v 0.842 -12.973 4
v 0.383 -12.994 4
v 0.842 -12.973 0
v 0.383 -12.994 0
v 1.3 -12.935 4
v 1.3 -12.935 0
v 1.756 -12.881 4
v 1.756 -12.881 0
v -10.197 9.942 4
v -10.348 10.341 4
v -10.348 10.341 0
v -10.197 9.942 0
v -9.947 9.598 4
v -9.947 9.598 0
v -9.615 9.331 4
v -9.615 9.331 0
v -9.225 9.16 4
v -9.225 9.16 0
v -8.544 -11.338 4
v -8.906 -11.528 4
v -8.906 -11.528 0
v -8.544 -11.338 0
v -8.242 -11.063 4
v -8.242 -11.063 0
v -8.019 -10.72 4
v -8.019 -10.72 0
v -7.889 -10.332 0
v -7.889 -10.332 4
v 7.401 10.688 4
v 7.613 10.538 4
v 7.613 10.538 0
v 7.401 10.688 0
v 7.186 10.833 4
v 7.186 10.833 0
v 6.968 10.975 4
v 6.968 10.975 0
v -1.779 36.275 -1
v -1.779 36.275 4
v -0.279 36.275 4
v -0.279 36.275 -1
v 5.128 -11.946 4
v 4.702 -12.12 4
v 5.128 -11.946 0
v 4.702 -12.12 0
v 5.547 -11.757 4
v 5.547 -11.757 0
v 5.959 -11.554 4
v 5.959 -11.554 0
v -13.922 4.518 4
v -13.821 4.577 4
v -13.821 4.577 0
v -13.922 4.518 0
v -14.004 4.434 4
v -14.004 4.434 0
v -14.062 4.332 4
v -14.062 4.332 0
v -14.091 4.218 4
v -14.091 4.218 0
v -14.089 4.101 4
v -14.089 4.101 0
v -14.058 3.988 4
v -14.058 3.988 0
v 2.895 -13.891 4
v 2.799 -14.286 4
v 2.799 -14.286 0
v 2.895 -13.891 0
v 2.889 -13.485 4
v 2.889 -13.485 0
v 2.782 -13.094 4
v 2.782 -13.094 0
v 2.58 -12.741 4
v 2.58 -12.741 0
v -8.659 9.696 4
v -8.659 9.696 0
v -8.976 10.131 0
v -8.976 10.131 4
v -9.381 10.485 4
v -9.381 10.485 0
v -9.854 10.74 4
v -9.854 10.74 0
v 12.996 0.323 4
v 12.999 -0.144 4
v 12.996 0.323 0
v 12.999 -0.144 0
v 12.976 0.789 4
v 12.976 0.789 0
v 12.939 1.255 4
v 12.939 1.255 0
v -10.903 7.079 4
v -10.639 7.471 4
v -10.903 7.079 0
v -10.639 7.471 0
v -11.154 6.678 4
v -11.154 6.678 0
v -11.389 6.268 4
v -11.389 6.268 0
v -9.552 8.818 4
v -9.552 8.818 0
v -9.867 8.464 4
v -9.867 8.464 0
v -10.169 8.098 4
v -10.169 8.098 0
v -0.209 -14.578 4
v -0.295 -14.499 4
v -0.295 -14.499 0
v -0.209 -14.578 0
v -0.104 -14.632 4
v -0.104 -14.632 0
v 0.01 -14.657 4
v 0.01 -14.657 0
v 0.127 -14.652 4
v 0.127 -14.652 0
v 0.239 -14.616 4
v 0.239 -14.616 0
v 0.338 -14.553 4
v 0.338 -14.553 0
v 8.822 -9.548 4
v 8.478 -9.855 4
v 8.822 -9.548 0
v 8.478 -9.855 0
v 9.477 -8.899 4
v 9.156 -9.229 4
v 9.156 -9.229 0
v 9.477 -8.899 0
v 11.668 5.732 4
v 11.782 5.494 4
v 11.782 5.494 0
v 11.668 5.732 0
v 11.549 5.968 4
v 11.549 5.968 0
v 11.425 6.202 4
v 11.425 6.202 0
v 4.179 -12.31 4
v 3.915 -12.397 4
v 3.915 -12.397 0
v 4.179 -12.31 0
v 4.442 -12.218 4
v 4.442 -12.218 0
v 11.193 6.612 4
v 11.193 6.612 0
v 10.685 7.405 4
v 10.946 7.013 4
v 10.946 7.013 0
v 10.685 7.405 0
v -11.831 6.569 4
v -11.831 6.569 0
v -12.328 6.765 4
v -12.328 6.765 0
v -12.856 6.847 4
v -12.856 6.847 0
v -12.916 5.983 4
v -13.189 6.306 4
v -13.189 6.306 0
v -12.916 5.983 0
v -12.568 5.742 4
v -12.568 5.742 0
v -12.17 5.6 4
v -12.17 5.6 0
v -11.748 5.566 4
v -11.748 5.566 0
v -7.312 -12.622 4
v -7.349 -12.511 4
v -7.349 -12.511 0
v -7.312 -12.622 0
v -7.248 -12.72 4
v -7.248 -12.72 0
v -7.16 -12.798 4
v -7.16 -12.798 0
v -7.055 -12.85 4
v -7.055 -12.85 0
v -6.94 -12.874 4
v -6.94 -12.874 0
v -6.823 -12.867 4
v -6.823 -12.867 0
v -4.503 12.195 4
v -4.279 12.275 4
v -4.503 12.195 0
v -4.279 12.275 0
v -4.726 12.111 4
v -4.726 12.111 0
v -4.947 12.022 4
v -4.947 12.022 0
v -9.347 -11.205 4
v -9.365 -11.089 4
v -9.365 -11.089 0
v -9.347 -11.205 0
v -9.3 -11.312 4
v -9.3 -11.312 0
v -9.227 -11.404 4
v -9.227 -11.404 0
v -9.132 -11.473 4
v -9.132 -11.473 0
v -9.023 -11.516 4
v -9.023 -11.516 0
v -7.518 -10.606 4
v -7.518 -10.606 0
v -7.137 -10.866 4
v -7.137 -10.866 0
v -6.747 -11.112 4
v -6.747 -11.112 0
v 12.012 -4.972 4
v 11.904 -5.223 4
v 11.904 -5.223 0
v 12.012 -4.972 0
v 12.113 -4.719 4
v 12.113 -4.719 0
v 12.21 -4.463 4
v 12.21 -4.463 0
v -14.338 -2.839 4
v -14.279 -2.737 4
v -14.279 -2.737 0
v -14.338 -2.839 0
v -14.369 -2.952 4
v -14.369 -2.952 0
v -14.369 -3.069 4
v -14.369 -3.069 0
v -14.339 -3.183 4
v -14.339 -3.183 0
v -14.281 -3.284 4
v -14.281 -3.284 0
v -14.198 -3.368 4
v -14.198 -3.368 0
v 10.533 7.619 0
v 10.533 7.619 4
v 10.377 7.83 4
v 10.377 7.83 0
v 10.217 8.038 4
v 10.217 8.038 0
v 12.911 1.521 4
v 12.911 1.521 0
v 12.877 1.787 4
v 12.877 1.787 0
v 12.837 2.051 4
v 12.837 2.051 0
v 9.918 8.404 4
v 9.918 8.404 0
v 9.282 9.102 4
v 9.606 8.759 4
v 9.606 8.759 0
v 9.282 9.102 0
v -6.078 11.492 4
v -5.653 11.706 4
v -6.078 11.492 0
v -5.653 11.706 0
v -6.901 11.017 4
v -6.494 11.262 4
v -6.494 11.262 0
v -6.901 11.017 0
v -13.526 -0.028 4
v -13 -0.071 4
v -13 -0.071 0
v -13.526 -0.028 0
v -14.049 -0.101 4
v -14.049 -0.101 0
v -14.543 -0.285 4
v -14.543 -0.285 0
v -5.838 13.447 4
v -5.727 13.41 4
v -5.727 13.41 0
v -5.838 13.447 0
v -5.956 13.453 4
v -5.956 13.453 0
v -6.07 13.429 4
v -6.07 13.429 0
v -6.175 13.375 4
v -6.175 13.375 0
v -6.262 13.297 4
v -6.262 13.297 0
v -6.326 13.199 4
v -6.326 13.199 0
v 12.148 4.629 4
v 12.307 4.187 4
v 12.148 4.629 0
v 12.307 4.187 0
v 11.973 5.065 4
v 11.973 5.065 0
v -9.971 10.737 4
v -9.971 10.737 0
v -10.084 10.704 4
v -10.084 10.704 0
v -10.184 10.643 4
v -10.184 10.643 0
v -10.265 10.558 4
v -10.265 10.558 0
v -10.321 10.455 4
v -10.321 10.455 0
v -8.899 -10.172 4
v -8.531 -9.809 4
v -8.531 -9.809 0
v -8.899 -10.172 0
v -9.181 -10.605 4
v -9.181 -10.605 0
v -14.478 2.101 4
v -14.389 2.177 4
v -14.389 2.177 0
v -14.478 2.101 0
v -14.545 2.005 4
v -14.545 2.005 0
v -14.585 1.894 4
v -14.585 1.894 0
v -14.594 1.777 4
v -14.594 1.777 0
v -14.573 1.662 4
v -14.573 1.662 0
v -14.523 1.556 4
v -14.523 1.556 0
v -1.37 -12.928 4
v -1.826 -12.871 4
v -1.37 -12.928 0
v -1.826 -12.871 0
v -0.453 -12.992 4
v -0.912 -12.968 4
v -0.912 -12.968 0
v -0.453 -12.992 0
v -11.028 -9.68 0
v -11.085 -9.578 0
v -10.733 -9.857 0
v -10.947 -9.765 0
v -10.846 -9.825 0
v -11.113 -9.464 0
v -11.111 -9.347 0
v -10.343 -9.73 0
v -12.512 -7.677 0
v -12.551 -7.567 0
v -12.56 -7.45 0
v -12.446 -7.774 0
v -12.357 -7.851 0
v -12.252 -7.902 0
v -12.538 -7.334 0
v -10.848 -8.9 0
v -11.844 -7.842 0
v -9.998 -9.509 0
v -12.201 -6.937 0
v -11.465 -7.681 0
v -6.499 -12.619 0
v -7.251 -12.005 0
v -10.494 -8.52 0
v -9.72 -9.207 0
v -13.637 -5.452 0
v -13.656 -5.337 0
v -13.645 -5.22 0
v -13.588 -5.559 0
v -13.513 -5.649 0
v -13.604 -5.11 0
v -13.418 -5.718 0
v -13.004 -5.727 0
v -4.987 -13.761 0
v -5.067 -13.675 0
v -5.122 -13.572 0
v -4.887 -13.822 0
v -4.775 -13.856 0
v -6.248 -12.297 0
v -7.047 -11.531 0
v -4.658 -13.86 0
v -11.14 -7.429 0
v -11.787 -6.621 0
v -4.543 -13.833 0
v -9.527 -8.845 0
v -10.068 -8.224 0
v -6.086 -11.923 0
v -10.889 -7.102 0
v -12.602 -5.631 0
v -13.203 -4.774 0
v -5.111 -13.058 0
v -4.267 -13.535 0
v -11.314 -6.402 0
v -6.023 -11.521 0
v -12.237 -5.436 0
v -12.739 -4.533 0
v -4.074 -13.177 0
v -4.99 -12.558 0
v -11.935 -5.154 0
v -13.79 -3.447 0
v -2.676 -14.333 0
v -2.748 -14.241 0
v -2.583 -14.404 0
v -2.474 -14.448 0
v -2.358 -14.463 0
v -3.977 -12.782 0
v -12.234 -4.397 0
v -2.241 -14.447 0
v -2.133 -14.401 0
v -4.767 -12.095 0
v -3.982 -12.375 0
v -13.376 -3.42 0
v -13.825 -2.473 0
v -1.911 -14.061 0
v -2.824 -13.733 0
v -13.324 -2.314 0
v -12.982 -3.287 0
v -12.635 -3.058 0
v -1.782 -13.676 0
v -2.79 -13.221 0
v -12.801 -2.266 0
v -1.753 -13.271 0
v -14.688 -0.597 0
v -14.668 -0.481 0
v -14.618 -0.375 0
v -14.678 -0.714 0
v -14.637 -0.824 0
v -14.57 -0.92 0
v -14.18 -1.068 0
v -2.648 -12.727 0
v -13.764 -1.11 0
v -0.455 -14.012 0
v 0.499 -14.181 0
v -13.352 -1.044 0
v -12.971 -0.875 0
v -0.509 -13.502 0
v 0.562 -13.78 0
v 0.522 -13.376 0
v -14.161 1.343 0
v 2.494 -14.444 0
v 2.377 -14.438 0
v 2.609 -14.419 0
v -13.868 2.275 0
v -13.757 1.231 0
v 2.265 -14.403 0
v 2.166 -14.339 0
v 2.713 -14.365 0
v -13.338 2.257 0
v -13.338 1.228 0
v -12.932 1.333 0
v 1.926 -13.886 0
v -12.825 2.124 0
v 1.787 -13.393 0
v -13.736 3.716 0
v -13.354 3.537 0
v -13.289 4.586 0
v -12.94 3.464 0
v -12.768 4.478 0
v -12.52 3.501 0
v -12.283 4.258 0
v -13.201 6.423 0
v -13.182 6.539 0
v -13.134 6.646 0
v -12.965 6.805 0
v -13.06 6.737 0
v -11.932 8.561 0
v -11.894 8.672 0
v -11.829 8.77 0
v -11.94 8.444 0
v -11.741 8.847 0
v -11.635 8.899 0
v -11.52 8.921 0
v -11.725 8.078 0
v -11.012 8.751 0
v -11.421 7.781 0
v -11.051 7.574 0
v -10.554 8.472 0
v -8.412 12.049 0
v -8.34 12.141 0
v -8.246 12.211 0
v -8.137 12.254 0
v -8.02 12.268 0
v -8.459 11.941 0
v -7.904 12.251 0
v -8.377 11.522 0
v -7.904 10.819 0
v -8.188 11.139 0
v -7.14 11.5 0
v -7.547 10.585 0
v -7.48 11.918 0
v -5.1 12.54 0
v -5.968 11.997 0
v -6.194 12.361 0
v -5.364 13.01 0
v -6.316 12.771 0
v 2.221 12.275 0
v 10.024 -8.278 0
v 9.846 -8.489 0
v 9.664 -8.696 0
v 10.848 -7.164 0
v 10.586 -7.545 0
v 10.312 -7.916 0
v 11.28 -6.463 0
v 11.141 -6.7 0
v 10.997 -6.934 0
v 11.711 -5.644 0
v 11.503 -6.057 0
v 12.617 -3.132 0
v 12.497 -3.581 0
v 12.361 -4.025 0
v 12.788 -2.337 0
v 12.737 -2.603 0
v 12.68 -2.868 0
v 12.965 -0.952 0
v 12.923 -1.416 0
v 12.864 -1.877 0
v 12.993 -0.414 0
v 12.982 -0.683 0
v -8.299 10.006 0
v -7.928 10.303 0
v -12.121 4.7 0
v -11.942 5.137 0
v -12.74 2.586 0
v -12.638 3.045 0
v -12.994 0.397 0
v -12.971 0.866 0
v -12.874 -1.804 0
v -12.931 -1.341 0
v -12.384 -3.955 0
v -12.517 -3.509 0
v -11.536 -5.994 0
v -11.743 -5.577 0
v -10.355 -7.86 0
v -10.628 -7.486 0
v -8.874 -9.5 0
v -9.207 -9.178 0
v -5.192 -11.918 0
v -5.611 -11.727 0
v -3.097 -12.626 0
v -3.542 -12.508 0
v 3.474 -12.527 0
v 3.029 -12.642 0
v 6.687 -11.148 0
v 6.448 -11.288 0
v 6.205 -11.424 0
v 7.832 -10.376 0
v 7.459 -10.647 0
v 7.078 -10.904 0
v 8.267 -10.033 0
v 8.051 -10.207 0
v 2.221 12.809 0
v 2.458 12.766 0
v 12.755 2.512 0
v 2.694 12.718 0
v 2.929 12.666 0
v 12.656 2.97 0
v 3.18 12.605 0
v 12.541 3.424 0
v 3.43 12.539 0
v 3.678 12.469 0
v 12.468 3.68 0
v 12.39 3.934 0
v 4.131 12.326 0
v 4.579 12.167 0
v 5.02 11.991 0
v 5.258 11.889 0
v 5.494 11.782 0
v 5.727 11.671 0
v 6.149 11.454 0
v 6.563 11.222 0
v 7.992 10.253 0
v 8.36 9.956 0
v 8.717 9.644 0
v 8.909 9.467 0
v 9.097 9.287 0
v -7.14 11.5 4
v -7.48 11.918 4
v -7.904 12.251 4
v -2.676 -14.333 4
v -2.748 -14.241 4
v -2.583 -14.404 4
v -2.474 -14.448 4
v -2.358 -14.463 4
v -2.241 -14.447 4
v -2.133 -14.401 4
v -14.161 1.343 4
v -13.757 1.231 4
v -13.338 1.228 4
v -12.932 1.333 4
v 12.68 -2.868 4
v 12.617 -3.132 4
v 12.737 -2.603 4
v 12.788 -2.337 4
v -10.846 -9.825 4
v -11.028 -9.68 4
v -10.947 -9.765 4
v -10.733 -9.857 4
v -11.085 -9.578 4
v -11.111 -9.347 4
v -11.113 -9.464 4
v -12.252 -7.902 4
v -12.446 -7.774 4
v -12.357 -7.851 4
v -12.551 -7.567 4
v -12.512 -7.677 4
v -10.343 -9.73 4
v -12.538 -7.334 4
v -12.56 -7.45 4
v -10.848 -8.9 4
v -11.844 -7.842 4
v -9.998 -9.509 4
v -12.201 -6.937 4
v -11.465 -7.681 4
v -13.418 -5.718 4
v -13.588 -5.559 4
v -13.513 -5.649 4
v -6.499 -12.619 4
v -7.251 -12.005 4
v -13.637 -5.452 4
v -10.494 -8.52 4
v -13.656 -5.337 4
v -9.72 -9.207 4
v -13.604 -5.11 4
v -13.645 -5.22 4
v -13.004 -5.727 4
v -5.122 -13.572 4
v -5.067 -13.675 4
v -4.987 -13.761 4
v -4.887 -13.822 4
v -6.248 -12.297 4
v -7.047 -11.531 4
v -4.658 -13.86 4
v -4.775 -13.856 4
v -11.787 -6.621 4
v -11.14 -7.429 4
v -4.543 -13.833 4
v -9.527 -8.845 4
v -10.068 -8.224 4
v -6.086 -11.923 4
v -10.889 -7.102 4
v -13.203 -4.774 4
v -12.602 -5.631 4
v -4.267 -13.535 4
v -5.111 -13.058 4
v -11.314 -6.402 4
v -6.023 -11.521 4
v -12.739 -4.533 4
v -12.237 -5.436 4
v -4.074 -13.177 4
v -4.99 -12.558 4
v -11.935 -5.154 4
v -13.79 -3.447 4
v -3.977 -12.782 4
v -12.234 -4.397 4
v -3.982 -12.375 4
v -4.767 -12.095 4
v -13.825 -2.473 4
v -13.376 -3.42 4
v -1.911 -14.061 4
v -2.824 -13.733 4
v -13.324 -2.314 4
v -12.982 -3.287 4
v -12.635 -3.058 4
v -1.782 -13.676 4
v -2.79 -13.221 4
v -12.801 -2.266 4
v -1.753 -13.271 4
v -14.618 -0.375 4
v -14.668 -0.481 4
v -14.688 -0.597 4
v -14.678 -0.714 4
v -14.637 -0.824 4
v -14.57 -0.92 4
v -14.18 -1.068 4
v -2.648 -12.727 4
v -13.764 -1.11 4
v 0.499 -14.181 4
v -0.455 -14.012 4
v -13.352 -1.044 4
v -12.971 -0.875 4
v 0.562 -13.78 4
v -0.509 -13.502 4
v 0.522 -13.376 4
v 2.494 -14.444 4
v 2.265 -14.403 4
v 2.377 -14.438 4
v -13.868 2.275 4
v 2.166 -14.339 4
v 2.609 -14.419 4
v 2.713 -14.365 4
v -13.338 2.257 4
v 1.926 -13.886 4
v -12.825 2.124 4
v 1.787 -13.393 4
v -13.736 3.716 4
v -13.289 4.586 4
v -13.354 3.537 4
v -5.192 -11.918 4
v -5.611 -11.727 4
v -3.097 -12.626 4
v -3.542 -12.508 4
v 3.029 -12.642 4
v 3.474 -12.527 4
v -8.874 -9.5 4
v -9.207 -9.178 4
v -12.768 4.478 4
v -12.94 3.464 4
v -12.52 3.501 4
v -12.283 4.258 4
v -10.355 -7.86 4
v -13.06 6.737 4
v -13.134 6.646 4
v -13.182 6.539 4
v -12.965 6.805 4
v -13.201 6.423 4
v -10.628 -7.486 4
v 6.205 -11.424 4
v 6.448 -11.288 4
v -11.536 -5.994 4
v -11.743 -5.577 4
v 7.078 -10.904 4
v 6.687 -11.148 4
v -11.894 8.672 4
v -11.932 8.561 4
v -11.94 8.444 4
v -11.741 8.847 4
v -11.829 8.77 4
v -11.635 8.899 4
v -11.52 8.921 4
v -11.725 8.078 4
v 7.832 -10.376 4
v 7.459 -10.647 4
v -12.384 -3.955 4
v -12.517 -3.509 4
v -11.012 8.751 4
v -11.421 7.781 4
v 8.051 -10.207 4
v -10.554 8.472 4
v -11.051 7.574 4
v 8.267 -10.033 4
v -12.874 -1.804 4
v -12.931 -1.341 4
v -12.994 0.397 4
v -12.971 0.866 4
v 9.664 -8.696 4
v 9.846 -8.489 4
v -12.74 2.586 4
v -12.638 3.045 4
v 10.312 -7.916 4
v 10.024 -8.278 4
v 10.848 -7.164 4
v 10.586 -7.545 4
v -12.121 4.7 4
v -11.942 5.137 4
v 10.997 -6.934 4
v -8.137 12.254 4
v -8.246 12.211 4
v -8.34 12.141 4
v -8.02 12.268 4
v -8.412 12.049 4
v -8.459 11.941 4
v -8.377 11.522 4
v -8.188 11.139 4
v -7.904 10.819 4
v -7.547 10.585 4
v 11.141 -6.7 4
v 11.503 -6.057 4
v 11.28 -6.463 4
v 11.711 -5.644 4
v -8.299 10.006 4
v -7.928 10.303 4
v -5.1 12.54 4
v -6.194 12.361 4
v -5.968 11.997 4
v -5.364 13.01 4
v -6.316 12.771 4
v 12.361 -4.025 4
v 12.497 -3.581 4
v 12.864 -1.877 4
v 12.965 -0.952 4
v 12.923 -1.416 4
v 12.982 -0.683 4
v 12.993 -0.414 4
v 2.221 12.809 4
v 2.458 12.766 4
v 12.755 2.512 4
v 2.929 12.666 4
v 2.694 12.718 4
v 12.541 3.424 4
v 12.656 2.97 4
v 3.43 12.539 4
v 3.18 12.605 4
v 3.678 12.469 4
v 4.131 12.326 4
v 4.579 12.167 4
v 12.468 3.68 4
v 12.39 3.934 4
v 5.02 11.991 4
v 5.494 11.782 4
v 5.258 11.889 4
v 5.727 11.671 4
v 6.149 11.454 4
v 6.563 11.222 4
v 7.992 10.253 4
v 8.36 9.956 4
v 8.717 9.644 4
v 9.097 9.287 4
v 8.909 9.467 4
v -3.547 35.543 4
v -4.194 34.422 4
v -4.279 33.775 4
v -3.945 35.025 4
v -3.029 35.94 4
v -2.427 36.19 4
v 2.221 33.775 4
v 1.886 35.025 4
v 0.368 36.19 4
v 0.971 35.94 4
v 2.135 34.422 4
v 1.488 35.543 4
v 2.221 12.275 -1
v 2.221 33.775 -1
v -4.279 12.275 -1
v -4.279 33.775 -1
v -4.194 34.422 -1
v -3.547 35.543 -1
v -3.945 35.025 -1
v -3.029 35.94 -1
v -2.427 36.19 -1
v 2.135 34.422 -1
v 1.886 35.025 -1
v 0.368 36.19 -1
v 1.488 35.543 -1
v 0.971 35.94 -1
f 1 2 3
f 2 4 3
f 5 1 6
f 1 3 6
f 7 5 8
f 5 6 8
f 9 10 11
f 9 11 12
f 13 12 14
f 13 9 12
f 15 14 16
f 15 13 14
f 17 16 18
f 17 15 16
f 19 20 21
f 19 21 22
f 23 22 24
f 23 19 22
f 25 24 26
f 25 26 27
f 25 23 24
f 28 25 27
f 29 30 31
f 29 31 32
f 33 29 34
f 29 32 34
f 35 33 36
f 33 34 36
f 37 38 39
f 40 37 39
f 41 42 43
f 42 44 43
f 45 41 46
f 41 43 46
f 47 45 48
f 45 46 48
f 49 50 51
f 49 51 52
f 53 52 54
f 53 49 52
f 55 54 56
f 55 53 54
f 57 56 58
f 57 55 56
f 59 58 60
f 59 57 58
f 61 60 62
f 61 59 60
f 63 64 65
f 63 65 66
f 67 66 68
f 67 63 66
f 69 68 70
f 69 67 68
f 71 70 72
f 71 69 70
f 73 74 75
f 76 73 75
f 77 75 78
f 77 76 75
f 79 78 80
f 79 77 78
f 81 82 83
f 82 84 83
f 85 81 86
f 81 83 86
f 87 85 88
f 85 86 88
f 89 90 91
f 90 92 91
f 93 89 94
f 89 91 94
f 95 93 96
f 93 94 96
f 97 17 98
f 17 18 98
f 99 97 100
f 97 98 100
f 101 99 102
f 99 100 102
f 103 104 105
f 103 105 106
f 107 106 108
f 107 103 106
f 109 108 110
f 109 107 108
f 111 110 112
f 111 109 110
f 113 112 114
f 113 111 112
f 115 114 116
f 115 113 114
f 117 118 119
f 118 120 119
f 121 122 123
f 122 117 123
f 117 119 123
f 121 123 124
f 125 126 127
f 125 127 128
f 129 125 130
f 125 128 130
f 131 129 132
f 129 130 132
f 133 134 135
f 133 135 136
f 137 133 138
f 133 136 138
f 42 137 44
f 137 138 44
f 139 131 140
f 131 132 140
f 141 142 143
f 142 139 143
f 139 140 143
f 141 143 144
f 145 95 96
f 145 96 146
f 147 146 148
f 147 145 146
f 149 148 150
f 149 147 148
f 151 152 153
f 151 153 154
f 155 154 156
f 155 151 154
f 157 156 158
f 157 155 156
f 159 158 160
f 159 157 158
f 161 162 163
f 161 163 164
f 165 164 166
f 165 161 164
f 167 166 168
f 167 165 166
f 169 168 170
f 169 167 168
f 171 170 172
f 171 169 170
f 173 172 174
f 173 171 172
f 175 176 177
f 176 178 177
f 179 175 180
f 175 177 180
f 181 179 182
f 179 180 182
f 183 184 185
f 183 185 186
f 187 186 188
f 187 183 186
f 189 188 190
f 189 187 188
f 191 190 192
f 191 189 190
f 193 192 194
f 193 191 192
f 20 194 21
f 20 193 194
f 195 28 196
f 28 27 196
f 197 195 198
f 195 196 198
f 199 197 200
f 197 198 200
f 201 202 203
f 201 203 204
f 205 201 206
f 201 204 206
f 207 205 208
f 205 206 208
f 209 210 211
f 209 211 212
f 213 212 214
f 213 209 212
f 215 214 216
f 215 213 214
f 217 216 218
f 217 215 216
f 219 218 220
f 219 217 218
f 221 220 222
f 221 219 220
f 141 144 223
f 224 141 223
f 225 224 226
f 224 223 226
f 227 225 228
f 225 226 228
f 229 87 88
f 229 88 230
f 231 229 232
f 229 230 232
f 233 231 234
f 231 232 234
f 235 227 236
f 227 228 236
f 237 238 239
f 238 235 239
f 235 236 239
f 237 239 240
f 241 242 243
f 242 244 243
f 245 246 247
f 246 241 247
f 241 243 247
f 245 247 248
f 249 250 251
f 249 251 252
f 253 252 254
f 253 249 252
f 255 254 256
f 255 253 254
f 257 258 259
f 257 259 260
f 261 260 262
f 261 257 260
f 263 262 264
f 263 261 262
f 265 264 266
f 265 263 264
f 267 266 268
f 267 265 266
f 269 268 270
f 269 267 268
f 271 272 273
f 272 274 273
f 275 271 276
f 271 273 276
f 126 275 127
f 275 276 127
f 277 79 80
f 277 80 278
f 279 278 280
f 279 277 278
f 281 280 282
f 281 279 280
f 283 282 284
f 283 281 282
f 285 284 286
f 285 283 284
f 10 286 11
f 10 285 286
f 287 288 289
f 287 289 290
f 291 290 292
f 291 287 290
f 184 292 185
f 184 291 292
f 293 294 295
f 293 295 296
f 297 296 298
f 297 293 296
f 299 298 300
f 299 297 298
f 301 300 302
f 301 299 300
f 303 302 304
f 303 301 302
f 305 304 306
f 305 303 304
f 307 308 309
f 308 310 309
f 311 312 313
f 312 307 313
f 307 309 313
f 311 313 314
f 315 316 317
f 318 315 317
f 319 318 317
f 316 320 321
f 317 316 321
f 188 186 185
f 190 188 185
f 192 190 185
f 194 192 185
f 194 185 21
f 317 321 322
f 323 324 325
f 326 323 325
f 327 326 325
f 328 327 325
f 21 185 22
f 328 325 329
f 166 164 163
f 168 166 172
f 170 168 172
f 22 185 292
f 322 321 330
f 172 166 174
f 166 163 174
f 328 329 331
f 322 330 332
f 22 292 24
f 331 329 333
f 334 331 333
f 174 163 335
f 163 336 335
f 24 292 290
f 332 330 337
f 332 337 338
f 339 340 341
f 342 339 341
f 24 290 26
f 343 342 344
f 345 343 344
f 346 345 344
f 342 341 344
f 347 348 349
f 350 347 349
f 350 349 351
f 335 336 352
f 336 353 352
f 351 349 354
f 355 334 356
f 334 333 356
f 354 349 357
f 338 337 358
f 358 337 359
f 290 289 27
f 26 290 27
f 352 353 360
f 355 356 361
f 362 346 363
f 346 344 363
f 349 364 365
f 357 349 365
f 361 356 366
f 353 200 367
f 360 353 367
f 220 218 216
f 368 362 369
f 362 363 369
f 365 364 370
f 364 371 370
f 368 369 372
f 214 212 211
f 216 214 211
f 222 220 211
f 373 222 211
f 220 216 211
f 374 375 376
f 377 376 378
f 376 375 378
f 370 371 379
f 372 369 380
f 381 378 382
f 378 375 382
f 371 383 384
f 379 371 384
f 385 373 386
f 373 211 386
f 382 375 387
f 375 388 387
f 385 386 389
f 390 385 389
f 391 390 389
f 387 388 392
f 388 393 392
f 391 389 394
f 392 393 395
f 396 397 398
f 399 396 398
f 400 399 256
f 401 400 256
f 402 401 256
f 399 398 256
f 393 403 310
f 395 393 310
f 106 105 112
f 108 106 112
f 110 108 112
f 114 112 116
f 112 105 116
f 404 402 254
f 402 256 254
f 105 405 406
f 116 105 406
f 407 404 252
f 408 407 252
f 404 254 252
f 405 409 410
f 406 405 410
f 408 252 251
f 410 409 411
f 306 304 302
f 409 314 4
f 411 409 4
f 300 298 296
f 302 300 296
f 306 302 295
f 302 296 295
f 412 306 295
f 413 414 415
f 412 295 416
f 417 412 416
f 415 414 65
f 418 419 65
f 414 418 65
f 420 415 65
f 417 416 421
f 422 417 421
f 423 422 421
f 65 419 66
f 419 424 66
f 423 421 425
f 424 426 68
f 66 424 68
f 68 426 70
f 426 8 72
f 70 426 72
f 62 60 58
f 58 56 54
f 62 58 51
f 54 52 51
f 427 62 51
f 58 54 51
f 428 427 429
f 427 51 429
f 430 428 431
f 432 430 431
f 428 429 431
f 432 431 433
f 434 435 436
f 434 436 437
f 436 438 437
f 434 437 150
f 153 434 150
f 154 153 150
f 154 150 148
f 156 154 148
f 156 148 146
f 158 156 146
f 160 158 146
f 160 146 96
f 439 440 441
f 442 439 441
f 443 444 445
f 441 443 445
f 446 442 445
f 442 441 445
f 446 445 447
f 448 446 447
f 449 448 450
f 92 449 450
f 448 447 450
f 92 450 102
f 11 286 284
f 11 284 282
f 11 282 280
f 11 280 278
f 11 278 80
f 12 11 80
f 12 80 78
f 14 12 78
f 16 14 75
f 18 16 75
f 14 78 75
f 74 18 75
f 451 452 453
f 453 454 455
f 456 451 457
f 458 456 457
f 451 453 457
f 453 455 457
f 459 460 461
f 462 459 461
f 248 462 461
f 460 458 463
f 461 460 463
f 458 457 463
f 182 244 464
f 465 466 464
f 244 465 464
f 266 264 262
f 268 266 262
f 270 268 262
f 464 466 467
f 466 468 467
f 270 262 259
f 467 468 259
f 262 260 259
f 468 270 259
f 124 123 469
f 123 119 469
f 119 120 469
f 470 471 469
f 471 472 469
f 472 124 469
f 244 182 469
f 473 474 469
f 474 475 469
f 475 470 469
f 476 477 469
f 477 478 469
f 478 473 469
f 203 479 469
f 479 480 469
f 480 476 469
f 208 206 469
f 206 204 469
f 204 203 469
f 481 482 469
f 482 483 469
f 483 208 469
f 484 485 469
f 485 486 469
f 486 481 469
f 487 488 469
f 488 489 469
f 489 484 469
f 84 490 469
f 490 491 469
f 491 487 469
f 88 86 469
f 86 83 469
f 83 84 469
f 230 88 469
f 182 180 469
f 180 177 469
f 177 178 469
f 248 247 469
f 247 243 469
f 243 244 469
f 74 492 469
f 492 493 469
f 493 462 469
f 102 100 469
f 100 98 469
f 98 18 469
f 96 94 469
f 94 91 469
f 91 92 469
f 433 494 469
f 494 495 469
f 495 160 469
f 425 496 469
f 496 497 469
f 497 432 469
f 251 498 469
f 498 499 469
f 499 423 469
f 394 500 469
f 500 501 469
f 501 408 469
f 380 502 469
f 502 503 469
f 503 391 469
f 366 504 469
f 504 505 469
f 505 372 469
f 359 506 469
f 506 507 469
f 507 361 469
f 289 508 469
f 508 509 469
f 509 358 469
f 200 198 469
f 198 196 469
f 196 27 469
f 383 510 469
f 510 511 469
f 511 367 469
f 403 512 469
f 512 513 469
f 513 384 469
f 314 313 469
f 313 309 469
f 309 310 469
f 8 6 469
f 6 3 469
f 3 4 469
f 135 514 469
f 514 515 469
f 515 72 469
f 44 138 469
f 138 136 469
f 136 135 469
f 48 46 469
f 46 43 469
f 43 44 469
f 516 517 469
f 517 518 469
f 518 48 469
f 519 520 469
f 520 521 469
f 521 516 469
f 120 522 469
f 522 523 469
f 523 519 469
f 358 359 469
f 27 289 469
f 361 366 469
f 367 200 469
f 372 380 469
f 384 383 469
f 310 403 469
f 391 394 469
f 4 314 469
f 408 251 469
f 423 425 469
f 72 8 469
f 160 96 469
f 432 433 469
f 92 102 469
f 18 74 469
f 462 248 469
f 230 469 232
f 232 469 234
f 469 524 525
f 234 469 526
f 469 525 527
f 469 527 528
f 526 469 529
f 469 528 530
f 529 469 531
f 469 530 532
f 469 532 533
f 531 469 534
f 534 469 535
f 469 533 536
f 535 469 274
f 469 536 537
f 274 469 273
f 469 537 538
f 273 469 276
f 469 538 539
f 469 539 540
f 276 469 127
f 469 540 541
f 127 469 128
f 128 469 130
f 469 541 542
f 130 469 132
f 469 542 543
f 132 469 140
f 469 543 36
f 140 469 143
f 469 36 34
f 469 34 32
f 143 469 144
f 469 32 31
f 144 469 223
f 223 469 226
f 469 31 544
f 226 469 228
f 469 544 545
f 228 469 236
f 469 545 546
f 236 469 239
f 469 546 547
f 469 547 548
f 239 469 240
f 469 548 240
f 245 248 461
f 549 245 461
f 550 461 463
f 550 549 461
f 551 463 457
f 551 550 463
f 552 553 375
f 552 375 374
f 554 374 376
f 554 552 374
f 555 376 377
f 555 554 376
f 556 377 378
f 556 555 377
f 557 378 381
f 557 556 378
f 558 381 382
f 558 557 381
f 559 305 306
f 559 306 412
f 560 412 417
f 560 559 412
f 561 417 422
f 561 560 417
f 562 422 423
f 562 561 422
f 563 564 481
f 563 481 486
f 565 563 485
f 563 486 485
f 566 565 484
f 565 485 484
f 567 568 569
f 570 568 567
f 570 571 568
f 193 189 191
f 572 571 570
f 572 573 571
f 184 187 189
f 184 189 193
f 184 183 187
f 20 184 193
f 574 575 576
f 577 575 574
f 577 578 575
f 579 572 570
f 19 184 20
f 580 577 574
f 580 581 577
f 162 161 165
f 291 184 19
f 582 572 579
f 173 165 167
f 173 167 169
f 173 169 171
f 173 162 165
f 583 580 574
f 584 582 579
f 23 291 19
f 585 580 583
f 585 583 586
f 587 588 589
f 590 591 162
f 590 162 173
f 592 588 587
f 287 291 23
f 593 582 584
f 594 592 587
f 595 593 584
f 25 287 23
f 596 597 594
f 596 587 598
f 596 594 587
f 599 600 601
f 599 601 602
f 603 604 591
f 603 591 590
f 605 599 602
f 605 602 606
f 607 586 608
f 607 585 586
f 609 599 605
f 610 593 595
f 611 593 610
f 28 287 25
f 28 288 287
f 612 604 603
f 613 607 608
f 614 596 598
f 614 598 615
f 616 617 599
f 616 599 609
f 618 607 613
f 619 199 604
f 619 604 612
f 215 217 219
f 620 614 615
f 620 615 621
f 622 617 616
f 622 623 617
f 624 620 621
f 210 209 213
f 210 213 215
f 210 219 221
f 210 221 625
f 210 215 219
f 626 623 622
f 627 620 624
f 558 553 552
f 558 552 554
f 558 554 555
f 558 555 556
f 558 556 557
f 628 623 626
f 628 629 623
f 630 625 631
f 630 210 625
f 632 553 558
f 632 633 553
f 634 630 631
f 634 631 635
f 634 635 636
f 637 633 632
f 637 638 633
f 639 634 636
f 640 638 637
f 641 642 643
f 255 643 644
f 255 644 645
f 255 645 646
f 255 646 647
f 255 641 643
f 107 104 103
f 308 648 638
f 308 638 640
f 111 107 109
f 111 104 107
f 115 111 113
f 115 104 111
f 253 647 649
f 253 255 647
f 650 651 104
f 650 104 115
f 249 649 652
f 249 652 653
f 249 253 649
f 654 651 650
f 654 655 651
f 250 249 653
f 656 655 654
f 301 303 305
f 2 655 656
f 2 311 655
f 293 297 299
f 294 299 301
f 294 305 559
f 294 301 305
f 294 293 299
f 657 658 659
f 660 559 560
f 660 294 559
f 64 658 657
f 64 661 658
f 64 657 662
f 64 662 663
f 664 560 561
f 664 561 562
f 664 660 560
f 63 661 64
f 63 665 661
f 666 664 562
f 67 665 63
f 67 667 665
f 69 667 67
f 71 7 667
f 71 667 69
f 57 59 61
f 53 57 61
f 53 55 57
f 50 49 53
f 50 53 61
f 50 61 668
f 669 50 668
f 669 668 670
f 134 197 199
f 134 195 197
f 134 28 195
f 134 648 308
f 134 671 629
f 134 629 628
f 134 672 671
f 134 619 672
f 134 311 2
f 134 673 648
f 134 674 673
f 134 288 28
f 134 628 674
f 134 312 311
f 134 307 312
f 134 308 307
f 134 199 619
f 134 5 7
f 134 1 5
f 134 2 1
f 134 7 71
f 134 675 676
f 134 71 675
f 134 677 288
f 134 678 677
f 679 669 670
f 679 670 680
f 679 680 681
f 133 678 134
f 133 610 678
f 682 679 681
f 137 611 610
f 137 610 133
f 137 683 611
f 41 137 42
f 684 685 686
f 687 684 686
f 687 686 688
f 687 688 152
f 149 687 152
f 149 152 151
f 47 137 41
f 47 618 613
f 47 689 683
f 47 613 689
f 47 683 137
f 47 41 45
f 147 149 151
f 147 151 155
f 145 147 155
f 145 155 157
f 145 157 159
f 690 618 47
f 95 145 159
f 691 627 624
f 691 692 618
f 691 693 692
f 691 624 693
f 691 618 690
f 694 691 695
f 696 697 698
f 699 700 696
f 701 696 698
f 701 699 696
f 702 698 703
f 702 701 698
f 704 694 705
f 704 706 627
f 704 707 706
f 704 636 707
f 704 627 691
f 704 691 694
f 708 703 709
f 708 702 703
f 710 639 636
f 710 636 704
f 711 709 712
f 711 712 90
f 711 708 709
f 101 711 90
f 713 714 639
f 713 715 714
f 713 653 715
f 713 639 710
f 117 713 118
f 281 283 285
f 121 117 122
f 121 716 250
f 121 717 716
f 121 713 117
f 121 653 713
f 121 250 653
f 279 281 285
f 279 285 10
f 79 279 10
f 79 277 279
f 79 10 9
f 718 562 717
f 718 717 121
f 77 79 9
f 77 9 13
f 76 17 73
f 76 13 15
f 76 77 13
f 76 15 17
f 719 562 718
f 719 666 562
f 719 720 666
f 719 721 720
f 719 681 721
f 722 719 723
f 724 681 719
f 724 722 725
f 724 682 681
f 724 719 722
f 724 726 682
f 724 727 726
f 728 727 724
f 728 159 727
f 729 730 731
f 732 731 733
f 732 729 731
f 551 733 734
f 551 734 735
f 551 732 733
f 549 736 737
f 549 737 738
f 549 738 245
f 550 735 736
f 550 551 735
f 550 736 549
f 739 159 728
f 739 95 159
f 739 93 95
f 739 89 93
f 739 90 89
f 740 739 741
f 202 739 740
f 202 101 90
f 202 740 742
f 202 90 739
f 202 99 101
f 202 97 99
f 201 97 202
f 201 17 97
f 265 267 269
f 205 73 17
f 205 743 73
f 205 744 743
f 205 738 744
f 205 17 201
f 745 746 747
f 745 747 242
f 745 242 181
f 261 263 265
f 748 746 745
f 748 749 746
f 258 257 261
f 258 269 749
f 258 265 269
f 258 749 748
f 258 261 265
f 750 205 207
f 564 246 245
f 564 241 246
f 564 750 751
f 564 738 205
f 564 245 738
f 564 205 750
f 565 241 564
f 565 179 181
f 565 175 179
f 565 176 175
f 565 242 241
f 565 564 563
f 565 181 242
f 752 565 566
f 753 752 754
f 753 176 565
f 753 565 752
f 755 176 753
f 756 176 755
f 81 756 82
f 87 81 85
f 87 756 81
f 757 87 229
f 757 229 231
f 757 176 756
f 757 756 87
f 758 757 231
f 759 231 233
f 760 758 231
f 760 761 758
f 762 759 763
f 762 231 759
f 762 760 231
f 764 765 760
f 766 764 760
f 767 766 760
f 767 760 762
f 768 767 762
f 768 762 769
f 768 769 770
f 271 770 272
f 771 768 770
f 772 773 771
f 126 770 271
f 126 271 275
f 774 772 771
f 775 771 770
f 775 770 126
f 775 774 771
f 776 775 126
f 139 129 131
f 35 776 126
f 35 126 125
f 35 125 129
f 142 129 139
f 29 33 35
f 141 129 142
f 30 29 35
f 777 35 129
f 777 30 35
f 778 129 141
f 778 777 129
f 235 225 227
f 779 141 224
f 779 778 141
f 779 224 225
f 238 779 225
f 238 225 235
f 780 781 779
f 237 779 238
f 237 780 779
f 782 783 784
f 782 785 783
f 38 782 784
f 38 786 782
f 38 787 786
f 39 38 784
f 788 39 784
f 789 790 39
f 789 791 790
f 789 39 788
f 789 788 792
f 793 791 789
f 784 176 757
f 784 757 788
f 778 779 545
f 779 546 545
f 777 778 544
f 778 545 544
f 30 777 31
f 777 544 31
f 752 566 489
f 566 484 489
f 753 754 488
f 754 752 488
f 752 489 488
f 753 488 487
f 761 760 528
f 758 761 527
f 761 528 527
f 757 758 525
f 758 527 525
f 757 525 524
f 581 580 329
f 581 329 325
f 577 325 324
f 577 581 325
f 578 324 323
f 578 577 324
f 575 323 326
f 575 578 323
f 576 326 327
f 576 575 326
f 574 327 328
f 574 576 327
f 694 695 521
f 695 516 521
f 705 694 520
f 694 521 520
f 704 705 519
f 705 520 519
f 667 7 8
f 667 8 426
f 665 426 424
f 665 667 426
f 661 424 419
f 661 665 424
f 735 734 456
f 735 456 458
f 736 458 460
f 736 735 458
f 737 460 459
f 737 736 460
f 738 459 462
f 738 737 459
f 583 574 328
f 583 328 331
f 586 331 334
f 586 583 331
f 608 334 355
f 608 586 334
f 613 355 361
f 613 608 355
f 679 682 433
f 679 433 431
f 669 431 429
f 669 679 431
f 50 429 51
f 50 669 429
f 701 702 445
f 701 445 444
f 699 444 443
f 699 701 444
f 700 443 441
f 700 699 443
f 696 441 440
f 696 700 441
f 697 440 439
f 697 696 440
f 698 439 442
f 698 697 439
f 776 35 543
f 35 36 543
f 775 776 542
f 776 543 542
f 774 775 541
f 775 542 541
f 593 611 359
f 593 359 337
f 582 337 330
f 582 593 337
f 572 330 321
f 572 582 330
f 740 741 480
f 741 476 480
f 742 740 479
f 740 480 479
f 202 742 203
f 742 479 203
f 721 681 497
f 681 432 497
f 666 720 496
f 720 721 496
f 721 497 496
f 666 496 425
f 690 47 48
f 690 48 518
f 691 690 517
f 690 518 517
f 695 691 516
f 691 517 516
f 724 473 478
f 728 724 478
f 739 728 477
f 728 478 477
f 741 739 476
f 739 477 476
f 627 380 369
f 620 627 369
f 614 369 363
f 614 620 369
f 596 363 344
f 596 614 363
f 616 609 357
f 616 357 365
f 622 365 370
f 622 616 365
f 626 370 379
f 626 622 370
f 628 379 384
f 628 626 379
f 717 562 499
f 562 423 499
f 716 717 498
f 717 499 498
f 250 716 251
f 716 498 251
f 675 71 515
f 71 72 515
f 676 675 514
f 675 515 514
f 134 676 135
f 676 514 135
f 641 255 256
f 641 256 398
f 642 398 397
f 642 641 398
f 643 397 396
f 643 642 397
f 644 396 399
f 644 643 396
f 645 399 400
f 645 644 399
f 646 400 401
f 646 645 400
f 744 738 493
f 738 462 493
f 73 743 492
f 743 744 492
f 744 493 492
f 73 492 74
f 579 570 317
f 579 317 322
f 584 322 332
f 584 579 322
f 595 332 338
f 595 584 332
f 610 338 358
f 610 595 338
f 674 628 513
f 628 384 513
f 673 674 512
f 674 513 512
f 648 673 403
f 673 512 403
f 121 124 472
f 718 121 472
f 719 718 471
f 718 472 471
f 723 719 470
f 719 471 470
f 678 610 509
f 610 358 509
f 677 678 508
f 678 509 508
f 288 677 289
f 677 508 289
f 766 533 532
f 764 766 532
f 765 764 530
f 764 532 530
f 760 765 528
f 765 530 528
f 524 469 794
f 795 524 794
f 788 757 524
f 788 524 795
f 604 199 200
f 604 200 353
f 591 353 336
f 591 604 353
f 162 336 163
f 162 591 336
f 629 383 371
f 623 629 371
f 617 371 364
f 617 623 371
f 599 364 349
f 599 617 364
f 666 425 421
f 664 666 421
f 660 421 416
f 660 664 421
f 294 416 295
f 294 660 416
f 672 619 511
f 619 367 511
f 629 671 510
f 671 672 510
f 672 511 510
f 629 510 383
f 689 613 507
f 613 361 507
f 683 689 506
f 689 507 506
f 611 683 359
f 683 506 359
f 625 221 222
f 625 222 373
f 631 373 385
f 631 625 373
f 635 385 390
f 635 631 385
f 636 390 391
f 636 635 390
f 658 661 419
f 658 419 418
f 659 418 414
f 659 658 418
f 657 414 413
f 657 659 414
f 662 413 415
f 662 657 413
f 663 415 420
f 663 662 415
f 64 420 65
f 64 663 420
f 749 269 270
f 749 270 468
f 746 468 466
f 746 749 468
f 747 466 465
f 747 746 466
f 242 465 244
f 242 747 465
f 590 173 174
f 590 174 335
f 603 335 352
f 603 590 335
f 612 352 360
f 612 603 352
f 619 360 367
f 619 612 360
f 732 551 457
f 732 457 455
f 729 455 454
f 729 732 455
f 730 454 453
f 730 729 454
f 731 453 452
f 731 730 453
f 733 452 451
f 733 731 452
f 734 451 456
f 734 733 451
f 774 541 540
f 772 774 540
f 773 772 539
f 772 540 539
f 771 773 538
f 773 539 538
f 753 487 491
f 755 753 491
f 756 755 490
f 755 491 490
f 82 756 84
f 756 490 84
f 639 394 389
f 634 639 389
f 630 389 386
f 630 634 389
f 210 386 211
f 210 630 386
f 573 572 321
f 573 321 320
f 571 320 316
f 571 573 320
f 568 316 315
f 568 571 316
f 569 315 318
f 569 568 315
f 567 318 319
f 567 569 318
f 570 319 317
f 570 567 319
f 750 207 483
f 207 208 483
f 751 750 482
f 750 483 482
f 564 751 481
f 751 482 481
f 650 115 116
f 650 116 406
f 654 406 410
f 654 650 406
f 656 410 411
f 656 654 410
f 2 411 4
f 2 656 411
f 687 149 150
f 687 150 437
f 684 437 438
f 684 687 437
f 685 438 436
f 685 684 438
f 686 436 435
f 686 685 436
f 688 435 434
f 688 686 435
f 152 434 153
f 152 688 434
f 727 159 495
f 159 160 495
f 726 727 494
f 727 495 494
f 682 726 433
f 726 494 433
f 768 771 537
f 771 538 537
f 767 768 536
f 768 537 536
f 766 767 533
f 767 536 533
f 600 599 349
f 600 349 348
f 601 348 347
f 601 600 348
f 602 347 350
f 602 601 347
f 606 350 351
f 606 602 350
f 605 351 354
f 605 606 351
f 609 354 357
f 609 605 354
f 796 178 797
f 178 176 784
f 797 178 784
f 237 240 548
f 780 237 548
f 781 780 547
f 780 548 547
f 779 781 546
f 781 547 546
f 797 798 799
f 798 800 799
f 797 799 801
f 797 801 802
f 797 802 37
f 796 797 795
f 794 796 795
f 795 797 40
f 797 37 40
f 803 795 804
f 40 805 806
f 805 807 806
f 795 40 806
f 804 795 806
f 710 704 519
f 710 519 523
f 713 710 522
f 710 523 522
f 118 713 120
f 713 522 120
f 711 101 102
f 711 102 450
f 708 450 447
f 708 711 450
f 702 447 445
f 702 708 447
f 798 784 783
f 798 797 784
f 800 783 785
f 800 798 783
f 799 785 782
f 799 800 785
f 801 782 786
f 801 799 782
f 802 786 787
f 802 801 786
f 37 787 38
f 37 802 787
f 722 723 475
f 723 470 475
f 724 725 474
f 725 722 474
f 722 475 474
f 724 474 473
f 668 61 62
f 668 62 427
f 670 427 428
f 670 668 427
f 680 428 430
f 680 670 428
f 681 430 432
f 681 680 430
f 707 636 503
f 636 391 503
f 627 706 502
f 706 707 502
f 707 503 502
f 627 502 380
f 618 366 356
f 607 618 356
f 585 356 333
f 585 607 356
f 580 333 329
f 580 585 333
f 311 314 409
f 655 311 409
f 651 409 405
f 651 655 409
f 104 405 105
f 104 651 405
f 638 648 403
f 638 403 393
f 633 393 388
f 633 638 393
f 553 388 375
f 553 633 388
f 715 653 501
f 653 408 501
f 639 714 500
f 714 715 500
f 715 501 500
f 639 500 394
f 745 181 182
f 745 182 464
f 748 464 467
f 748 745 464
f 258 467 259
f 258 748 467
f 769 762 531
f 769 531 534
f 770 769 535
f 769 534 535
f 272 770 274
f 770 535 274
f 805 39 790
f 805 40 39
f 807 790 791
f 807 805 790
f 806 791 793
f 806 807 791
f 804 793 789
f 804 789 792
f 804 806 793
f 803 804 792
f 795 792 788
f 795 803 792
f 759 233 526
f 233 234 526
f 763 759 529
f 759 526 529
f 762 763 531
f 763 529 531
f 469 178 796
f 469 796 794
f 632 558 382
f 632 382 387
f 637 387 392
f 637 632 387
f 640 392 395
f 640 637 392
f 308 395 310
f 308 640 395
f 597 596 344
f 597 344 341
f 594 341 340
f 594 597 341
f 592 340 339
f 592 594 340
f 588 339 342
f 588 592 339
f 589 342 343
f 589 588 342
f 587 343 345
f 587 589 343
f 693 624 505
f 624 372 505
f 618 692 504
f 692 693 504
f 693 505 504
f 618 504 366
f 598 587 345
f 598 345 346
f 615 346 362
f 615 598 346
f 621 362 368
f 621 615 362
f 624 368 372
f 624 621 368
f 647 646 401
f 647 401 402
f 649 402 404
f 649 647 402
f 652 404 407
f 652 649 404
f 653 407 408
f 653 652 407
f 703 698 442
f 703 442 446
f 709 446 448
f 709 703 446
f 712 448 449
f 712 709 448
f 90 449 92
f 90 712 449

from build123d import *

# Parameters (mm, degrees)
SKETCH1_R           = 13
BOSS_EXTRUDE1_DEPTH = 4
BOSS_EXTRUDE2_DEPTH = 4
CIRPATTERN1_COUNT   = 37
CUT_EXTRUDE1_START  = -6
CUT_EXTRUDE1_DEPTH  = 6
SKETCH5_W           = 6.5
SKETCH5_H           = 24
BOSS_EXTRUDE3_DEPTH = 5
FILLET1_R           = 2.5


with BuildPart() as part:
    # Sketch1 → Boss-Extrude1 (new body)
    with BuildSketch(Plane.XY):
        Circle(SKETCH1_R)
    extrude(amount=BOSS_EXTRUDE1_DEPTH)

    # Sketch2 → Boss-Extrude2 (add)
    with BuildSketch(Plane.XY.offset(4)):
        with BuildLine():
            Line((-1.442756516, 12.919692475), (-0.673396871, 12.982547387))
            ThreePointArc((-0.673396871, 12.982547387), (-0.676161598, 13.791154594), (-0.946073249, 14.553388784))
            ThreePointArc((-0.946073249, 14.553388784), (-1.263795502, 14.68499365), (-1.581517754, 14.553388784))
            ThreePointArc((-1.581517754, 14.553388784), (-1.735779337, 13.717545135), (-1.442756516, 12.919692475))
        make_face()
    boss_extrude2 = extrude(amount=-BOSS_EXTRUDE2_DEPTH)

    # CirPattern1: Boss-Extrude2 ×37 about axis
    cirpattern1_axis = Axis((-0.003550518, 0.04085181, 0), (0, 0, 1))
    for i in range(1, CIRPATTERN1_COUNT):
        add(boss_extrude2.rotate(cirpattern1_axis, i * 360 / CIRPATTERN1_COUNT))

    # Sketch3 → Cut-Extrude1 (cut)
    with BuildSketch(Plane.XY.offset(4).offset(CUT_EXTRUDE1_START)):
        with BuildLine():
            ThreePointArc((2.580226265, -12.741366976), (12.998773331, -0.178582984), (2.929279614, 12.665674911))
            ThreePointArc((2.929279614, 12.665674911), (2.706489738, 14.000196281), (3.492602617, 15.101381624))
            ThreePointArc((3.492602617, 15.101381624), (15.498537433, -0.212925866), (3.076423624, -15.191629856))
            ThreePointArc((3.076423624, -15.191629856), (3.335791003, -13.863732578), (2.580226265, -12.741366976))
        make_face()
    extrude(amount=CUT_EXTRUDE1_DEPTH, mode=Mode.SUBTRACT)

    # Sketch5 → Boss-Extrude3 (add)
    with BuildSketch(Plane.XY.offset(4)):
        with Locations((-1.029483868, 24.275423326)):
            Rectangle(SKETCH5_W, SKETCH5_H)
    extrude(amount=-BOSS_EXTRUDE3_DEPTH)

    # Fillet1
    fillet1_edges = [part.edges().sort_by_distance(p)[0] for p in [
        (2.220516132, 36.275423326, 1.5),
        (-4.279483868, 36.275423326, 1.5),
    ]]
    fillet(fillet1_edges, radius=FILLET1_R)


solid = part.part
